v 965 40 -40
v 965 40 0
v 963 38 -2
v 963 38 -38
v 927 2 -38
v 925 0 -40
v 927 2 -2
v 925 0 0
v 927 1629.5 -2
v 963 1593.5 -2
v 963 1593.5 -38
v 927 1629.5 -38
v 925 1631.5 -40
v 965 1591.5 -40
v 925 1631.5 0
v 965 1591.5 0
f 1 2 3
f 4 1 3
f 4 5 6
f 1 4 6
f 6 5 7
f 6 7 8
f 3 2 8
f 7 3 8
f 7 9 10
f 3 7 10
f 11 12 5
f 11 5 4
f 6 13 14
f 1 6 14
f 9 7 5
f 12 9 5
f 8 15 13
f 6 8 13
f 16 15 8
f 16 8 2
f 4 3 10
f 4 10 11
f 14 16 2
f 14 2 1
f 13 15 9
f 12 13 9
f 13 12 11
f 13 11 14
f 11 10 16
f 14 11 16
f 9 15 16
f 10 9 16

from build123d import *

# Parameters (mm, degrees)
SKETCH2_W           = 40
SKETCH2_H           = 40
SKETCH2_W_2         = 36
SKETCH2_H_2         = 36
BOSS_EXTRUDE1_DEPTH = 1631.5
CUT_EXTRUDE1_REACH  = 1897.948


with BuildPart() as part:
    # Sketch2 → Boss-Extrude1 (new body)
    with BuildSketch(Plane(origin=(0, 1631.5, 0), x_dir=(1, 0, 0), z_dir=(0, 1, 0))):
        with Locations((945, 20)):
            Rectangle(SKETCH2_W, SKETCH2_H)
        with Locations((945, 20)):
            Rectangle(SKETCH2_W_2, SKETCH2_H_2, mode=Mode.SUBTRACT)
    extrude(amount=-BOSS_EXTRUDE1_DEPTH)

    # Cut-Extrude1: up to this face of the body (flat: up to its plane)
    cut_extrude1_end = Plane(part.part.faces().sort_by_distance((945, 815.75, -40))[0])
    # Sketch3 → Cut-Extrude1 (cut, up to the picked face)
    with BuildSketch(Plane.XY, mode=Mode.PRIVATE) as cut_extrude1_sk1:
        Polygon((965, 0), (965, 40), (925, 0), align=None)
    cut_extrude1_tool1 = split(extrude(cut_extrude1_sk1.sketch, amount=-CUT_EXTRUDE1_REACH, mode=Mode.PRIVATE), bisect_by=cut_extrude1_end, keep=Keep.BOTH, mode=Mode.PRIVATE)
    # Sketch3 → Cut-Extrude1 (cut, up to the picked face)
    with BuildSketch(Plane.XY, mode=Mode.PRIVATE) as cut_extrude1_sk2:
        Polygon((965, 1631.5), (925, 1631.5), (965, 1591.5), align=None)
    cut_extrude1_tool2 = split(extrude(cut_extrude1_sk2.sketch, amount=-CUT_EXTRUDE1_REACH, mode=Mode.PRIVATE), bisect_by=cut_extrude1_end, keep=Keep.BOTH, mode=Mode.PRIVATE)
    add(cut_extrude1_tool1.solids().sort_by(Axis((951.666667, 13.333333, 0), (0, 0, -1)))[0], mode=Mode.SUBTRACT)
    add(cut_extrude1_tool2.solids().sort_by(Axis((951.666667, 1618.166667, 0), (0, 0, -1)))[0], mode=Mode.SUBTRACT)


solid = part.part
